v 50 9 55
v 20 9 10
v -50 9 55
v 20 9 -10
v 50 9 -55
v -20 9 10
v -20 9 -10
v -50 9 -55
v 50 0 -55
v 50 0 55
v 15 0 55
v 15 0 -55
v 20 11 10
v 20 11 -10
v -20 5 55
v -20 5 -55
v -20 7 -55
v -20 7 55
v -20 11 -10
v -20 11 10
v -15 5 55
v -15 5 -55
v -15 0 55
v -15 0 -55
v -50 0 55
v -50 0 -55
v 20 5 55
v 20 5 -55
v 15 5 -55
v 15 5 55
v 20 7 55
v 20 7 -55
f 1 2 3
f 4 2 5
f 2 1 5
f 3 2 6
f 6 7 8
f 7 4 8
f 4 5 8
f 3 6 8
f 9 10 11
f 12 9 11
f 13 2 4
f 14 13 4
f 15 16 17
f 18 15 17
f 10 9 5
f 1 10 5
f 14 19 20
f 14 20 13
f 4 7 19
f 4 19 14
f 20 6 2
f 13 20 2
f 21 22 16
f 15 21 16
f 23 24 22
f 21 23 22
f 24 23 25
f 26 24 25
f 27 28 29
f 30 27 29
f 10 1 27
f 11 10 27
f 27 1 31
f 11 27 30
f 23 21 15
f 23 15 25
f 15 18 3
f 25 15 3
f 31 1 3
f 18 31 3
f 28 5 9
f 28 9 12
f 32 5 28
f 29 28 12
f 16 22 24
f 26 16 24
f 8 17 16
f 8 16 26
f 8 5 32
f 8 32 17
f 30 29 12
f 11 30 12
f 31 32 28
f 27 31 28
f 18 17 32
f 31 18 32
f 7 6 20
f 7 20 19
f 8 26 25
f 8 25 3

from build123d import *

# Parameters (mm, degrees)
SKETCH2_W          = 100
SKETCH2_H          = 9
EXTRUDE1_DEPTH     = 55
CUT_EXTRUDE1_DEPTH = 111
SKETCH7_W          = 40
SKETCH7_H          = 20
EXTRUDE2_DEPTH     = 2


with BuildPart() as part:
    # Sketch2 → Extrude1 (new body, symmetric)
    with BuildSketch(Plane(origin=(0, 0, 0), x_dir=(-1, 0, 0), z_dir=(0, 0, -1))):
        with Locations((0, 4.5)):
            Rectangle(SKETCH2_W, SKETCH2_H)
    extrude(amount=EXTRUDE1_DEPTH, both=True)

    # Sketch5 → Cut-Extrude1 (cut, through all)
    with BuildSketch(Plane(origin=(0, 0, -55), x_dir=(-1, 0, 0), z_dir=(0, 0, -1))):
        Polygon((20, 5), (20, 7), (-20, 7), (-20, 5), (-15, 5), (-15, 0), (15, 0), (15, 5), align=None)
    extrude(amount=-CUT_EXTRUDE1_DEPTH, mode=Mode.SUBTRACT)

    # Sketch7 → Extrude2 (add)
    with BuildSketch(Plane(origin=(0, 9, 0), x_dir=(1, 0, 0), z_dir=(0, 1, 0))):
        Rectangle(SKETCH7_W, SKETCH7_H)
    extrude(amount=EXTRUDE2_DEPTH)


solid = part.part
